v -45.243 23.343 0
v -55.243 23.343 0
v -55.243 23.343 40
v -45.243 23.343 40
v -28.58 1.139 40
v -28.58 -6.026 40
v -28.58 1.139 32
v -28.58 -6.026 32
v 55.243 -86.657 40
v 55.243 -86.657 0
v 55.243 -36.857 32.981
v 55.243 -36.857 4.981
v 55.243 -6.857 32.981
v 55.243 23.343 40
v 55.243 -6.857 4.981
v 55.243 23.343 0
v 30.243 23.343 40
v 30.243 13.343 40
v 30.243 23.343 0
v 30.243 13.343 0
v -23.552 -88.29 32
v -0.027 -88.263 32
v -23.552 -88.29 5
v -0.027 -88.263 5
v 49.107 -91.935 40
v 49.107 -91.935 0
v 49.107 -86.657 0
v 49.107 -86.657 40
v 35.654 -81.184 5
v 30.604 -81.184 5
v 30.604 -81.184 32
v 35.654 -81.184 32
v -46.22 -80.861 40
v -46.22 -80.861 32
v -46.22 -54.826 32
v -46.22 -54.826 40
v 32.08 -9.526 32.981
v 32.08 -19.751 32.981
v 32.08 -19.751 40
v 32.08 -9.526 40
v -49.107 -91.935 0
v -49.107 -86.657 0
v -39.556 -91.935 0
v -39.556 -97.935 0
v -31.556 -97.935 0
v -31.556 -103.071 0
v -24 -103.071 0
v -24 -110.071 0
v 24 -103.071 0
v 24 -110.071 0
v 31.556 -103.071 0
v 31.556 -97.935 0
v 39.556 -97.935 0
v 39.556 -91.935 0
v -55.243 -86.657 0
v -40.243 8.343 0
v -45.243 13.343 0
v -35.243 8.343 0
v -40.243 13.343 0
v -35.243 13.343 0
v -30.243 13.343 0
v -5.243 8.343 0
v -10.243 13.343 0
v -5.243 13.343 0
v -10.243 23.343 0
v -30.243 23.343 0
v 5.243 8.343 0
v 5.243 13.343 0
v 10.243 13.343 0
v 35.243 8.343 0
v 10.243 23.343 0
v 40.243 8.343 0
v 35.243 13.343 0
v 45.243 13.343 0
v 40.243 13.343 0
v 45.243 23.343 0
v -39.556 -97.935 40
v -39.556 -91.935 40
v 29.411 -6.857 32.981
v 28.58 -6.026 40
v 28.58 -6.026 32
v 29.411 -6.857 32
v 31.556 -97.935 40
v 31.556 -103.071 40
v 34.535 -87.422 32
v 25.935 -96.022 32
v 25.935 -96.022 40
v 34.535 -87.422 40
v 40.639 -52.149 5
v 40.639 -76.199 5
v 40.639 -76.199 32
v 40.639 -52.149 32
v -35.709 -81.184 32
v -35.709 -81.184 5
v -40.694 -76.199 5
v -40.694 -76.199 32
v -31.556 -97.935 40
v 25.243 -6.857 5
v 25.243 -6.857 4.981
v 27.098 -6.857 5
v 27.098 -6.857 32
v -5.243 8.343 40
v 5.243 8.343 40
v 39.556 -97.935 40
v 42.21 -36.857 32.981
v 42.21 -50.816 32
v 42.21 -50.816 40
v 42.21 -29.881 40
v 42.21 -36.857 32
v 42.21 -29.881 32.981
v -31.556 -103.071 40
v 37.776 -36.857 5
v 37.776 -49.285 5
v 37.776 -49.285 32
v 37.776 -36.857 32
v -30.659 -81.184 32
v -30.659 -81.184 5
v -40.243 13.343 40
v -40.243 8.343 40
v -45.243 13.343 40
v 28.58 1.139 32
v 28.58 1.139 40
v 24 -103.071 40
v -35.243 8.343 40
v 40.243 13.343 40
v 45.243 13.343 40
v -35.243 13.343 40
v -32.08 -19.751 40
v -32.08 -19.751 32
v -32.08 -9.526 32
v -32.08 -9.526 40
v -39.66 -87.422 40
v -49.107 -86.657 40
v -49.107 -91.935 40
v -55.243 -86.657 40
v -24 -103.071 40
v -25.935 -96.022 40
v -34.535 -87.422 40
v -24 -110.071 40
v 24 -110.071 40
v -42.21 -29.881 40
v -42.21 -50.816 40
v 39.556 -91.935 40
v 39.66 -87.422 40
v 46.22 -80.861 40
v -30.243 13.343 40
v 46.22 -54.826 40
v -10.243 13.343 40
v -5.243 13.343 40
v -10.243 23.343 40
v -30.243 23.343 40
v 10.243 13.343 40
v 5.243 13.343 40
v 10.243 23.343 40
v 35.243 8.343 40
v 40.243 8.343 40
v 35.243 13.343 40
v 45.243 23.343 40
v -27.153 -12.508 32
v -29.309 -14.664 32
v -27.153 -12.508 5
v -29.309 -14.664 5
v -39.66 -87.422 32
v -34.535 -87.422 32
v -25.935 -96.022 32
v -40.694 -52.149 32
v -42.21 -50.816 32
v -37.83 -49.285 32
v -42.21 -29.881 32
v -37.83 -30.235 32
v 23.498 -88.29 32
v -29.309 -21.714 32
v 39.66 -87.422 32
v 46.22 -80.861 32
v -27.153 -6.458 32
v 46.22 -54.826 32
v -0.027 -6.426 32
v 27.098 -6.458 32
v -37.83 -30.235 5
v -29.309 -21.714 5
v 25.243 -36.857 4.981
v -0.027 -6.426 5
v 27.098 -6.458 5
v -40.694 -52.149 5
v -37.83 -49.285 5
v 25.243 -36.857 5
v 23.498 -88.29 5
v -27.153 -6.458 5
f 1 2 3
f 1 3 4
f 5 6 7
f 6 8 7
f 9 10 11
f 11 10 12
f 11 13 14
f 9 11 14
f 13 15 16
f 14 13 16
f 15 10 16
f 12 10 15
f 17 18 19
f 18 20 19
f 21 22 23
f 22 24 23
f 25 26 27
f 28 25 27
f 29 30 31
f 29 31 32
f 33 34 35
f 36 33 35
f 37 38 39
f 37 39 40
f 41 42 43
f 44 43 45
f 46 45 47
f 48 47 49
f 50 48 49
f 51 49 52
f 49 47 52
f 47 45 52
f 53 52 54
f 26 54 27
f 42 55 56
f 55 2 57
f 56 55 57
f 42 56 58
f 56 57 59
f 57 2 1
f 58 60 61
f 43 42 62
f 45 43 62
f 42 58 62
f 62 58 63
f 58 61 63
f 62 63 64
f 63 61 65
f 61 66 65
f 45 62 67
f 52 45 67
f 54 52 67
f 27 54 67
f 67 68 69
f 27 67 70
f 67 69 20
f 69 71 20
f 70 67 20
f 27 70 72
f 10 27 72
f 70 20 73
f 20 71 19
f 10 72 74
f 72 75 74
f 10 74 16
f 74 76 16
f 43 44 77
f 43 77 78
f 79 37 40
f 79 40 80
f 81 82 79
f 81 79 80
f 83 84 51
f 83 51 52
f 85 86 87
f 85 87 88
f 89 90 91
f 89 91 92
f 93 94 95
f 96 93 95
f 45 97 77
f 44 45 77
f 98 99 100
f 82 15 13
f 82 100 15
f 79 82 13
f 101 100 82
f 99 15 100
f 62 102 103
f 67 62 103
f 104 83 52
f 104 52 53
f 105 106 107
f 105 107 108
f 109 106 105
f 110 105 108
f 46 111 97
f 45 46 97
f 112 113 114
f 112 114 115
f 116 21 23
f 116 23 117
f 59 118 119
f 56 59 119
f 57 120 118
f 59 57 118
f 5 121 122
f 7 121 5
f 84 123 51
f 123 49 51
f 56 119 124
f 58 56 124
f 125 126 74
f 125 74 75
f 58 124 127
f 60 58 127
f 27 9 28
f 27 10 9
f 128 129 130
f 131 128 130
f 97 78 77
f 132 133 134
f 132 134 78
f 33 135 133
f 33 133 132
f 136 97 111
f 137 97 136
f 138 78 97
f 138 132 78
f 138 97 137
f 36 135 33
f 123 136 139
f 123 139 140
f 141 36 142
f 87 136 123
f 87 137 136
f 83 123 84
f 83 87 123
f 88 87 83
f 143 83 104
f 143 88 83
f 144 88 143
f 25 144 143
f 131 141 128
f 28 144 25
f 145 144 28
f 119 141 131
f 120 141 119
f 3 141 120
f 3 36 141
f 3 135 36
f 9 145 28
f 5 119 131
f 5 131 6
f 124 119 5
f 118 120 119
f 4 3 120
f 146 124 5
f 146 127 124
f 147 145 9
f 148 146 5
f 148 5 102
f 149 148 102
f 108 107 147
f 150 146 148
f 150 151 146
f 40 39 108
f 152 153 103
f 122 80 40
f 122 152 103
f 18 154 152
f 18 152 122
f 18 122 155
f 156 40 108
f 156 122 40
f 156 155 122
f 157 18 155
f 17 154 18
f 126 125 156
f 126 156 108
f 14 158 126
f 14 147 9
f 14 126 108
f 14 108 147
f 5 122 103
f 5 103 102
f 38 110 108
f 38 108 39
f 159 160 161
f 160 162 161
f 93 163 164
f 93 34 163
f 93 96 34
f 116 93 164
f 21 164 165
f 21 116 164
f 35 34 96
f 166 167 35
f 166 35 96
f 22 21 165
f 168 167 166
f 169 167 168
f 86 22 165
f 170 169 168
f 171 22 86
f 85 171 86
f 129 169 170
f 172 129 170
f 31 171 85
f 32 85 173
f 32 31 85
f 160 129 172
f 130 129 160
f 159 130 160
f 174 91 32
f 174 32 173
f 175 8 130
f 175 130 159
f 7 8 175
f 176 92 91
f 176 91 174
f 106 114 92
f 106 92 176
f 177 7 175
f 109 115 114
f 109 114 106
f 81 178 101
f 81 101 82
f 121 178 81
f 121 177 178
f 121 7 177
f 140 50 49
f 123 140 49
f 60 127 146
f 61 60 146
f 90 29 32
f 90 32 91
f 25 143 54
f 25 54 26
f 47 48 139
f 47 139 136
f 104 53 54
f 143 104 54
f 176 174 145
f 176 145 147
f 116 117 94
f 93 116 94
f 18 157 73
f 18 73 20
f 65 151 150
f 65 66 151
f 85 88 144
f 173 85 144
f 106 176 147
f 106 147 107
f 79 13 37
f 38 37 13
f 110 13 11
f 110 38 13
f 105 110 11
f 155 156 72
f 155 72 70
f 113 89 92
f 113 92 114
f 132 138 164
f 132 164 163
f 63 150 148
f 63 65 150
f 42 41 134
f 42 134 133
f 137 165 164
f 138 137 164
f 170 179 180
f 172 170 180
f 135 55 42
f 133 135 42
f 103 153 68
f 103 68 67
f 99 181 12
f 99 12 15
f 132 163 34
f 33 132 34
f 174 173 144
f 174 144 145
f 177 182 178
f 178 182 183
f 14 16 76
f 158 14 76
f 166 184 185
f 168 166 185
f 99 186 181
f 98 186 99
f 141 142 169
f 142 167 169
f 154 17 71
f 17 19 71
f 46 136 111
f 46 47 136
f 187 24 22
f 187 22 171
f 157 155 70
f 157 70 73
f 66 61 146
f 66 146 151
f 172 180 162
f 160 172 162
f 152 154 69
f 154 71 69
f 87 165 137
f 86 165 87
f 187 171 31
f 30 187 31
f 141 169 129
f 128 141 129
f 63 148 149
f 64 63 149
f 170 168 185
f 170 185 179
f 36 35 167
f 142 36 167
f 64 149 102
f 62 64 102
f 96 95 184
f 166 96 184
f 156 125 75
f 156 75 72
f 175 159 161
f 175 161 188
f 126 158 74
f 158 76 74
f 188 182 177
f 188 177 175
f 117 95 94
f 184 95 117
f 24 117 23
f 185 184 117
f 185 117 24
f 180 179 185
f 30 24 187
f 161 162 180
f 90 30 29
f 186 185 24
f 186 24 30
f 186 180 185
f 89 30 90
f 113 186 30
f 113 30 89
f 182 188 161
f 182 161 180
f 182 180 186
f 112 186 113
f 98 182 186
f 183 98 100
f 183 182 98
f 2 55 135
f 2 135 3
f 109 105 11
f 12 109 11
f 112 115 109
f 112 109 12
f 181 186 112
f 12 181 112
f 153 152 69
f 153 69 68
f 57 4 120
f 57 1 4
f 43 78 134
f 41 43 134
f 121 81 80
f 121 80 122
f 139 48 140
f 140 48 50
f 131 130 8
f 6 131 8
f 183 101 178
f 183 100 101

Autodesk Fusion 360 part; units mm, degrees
sketch "Boceto1" plane through (0, 0, 0) normal (0, 0, 1) x (1, 0, 0)
  line L0 (0, 0) -> (0, 10) construction
  line L1 (55.2426, -86.6569) -> (49.1066, -86.6569)
  line L2 (0, -110.0711) -> (24, -110.0711)
  line L3 (24, -110.0711) -> (24, -103.0711)
  line L4 (24, -103.0711) -> (31.5563, -103.0711)
  line L5 (31.5563, -103.0711) -> (31.5563, -97.935)
  line L6 (31.5563, -97.935) -> (39.5563, -97.935)
  line L7 (39.5563, -97.935) -> (39.5563, -91.935)
  line L8 (39.5563, -91.935) -> (49.1066, -91.935)
  line L9 (49.1066, -91.935) -> (49.1066, -86.6569)
  line L10 (55.2426, -86.6569) -> (55.2426, 23.3431)
  line L11 (55.2426, 23.3431) -> (45.2426, 23.3431)
  line L12 (45.2426, 23.3431) -> (45.2426, 13.3431)
  line L13 (45.2426, 13.3431) -> (40.2426, 13.3431)
  line L14 (40.2426, 13.3431) -> (40.2426, 8.3431)
  line L15 (40.2426, 8.3431) -> (35.2426, 8.3431)
  line L16 (35.2426, 8.3431) -> (35.2426, 13.3431)
  line L17 (35.2426, 13.3431) -> (30.2426, 13.3431)
  line L18 (30.2426, 13.3431) -> (30.2426, 23.3431)
  line L19 (30.2426, 23.3431) -> (10.2426, 23.3431)
  line L20 (10.2426, 23.3431) -> (10.2426, 13.3431)
  line L21 (10.2426, 13.3431) -> (5.2426, 13.3431)
  line L22 (5.2426, 13.3431) -> (5.2426, 8.3431)
  line L23 (5.2426, 8.3431) -> (0, 8.3431)
  line L24 (0, -110.0711) -> (-24, -110.0711)
  line L25 (-24, -110.0711) -> (-24, -103.0711)
  line L26 (-24, -103.0711) -> (-31.5563, -103.0711)
  line L27 (-31.5563, -103.0711) -> (-31.5563, -97.935)
  line L28 (-31.5563, -97.935) -> (-39.5563, -97.935)
  line L29 (-39.5563, -97.935) -> (-39.5563, -91.935)
  line L30 (-39.5563, -91.935) -> (-49.1066, -91.935)
  line L31 (-49.1066, -91.935) -> (-49.1066, -86.6569)
  line L32 (-55.2426, -86.6569) -> (-49.1066, -86.6569)
  line L33 (-55.2426, -86.6569) -> (-55.2426, 23.3431)
  line L34 (-55.2426, 23.3431) -> (-45.2426, 23.3431)
  line L35 (-45.2426, 23.3431) -> (-45.2426, 13.3431)
  line L36 (-45.2426, 13.3431) -> (-40.2426, 13.3431)
  line L37 (-40.2426, 13.3431) -> (-40.2426, 8.3431)
  line L38 (-40.2426, 8.3431) -> (-35.2426, 8.3431)
  line L39 (-35.2426, 8.3431) -> (-35.2426, 13.3431)
  line L40 (-35.2426, 13.3431) -> (-30.2426, 13.3431)
  line L41 (-30.2426, 13.3431) -> (-30.2426, 23.3431)
  line L42 (-30.2426, 23.3431) -> (-10.2426, 23.3431)
  line L43 (-10.2426, 23.3431) -> (-10.2426, 13.3431)
  line L44 (-10.2426, 13.3431) -> (-5.2426, 13.3431)
  line L45 (-5.2426, 13.3431) -> (-5.2426, 8.3431)
  line L46 (-5.2426, 8.3431) -> (0, 8.3431)
  line L47 (-40.4532, -52.2423) -> (-36.5208, -52.2423) construction
  line L48 (-0.0272, -88.2631) -> (-23.5522, -88.2903)
  line L49 (-23.5522, -88.2903) -> (-30.6587, -81.1839)
  line L50 (-23.5522, -88.2903) -> (-13.5022, -88.2903) construction
  line L51 (-30.6587, -81.1839) -> (-35.7087, -81.1839)
  line L52 (-35.7087, -81.1839) -> (-40.6938, -76.1988)
  line L53 (-35.7087, -81.1839) -> (-28.6587, -81.1839) construction
  line L54 (-40.6938, -76.1988) -> (-40.6938, -52.1488)
  line L55 (-40.6938, -52.1488) -> (-37.83, -49.285)
  line L56 (-40.6938, -52.1488) -> (-36.6438, -52.1488) construction
  line L57 (-37.83, -49.285) -> (-37.83, -30.235)
  line L58 (-37.83, -30.235) -> (-29.3093, -21.7144)
  line L59 (-37.83, -30.235) -> (-25.78, -30.235) construction
  line L60 (-29.3093, -21.7144) -> (-29.3093, -14.6644)
  line L61 (-29.3093, -14.6644) -> (-27.1527, -12.5077)
  line L62 (-29.3093, -14.6644) -> (-26.2593, -14.6644) construction
  line L63 (-27.1527, -12.5077) -> (-27.1527, -6.4577)
  line L64 (-0.0272, -88.2631) -> (-0.0272, -6.4263) construction
  line L65 (-0.0272, -6.4263) -> (-27.1527, -6.4577)
  line L66 (-0.0272, -88.2631) -> (23.4977, -88.2903)
  line L67 (23.4977, -88.2903) -> (30.6042, -81.1839)
  line L68 (30.6042, -81.1839) -> (35.6542, -81.1839)
  line L69 (35.6542, -81.1839) -> (40.6393, -76.1988)
  line L70 (40.6393, -76.1988) -> (40.6393, -52.1488)
  line L71 (40.6393, -52.1488) -> (37.7755, -49.285)
  line L72 (37.7755, -49.285) -> (37.7755, -30.235)
  line L73 (37.7755, -30.235) -> (29.2548, -21.7144)
  line L74 (29.2548, -21.7144) -> (29.2548, -14.6644)
  line L75 (29.2548, -14.6644) -> (27.0982, -12.5077)
  line L76 (27.0982, -12.5077) -> (27.0982, -6.4577)
  line L77 (-0.0272, -6.4263) -> (27.0982, -6.4577)
  line L78 (0, -96.0218) -> (0, 0.9507) construction
  line L79 (0, -96.0218) -> (-25.935, -96.0218)
  line L80 (-25.935, -96.0218) -> (-34.5352, -87.4216)
  line L81 (-25.935, -96.0218) -> (-13.7725, -96.0218) construction
  line L82 (-34.5352, -87.4216) -> (-39.6602, -87.4216)
  line L83 (-39.6602, -87.4216) -> (-46.2203, -80.8614)
  line L84 (-39.6602, -87.4216) -> (-30.3827, -87.4216) construction
  line L85 (-46.2203, -80.8614) -> (-46.2203, -54.8264)
  line L86 (-46.2203, -54.8264) -> (-42.2102, -50.8163)
  line L87 (-46.2203, -54.8264) -> (-40.5491, -54.8264) construction
  line L88 (-42.2102, -50.8163) -> (-42.2102, -29.8813)
  line L89 (-42.2102, -29.8813) -> (-32.08, -19.7511)
  line L90 (-42.2102, -29.8813) -> (-27.8839, -29.8813) construction
  line L91 (-32.08, -19.7511) -> (-32.08, -9.5261)
  line L92 (-32.08, -9.5261) -> (-28.5798, -6.0259)
  line L93 (-32.08, -9.5261) -> (-27.13, -9.5261) construction
  line L94 (-28.5798, -6.0259) -> (-28.5798, 1.1391)
  line L95 (-28.5798, 1.1391) -> (0, 1.1391)
  line L96 (0, -96.0218) -> (25.935, -96.0218)
  line L97 (25.935, -96.0218) -> (34.5352, -87.4216)
  line L98 (34.5352, -87.4216) -> (39.6602, -87.4216)
  line L99 (39.6602, -87.4216) -> (46.2203, -80.8614)
  line L100 (46.2203, -80.8614) -> (46.2203, -54.8264)
  line L101 (46.2203, -54.8264) -> (42.2102, -50.8163)
  line L102 (42.2102, -50.8163) -> (42.2102, -29.8813)
  line L103 (42.2102, -29.8813) -> (32.08, -19.7511)
  line L104 (32.08, -19.7511) -> (32.08, -9.5261)
  line L105 (32.08, -9.5261) -> (28.5798, -6.0259)
  line L106 (28.5798, -6.0259) -> (28.5798, 1.1391)
  line L107 (28.5798, 1.1391) -> (0, 1.1391)
  point P0 (0, 4.7536)
  point P1 (0, 4.7536)
  point P2 (0, 4.7536)
  point P3 (0, -47.5355)
  point P4 (0, 2.3859)
  point P5 (0, 2.3859)
  point P6 (0, 2.3859)
  point P7 (0, -47.5355)
  point P8 (0, 0.9507)
  point P9 (0, -47.5355)
  point P10 (0, 0.9507)
  point P11 (0, -47.5355)
  point P12 (0, 0.9507)
  dimension "d46" = 24
  dimension "d48" = 7
  dimension "d49" = 8
  dimension "d50" = 6
  dimension "d52" = 110
  dimension "d53" = 10
  dimension "d54" = 10
  dimension "d55" = 5
  dimension "d56" = 5
  dimension "d57" = 5
  dimension "d58" = 5
  dimension "d59" = 5
  dimension "d60" = 10
  dimension "d61" = 20
  dimension "d62" = 10
  dimension "d63" = 5
  dimension "d64" = 5
  dimension "d144" = 135
  dimension "d145" = 10.05
  dimension "d146" = 5.05
  dimension "d147" = 135
  dimension "d148" = 7.05
  dimension "d149" = 24.05
  dimension "d150" = 4.05
  dimension "d151" = 45
  dimension "d152" = 19.05
  dimension "d153" = 45
  dimension "d154" = 12.05
  dimension "d155" = 7.05
  dimension "d156" = 3.05
  dimension "d157" = 45
  dimension "d158" = 6.05
  dimension "d168" = 135
  dimension "d169" = 12.1625
  dimension "d171" = 5.125
  dimension "d173" = 135
  dimension "d174" = 9.2775
  dimension "d176" = 26.035
  dimension "d178" = 5.6712
  dimension "d179" = 45
  dimension "d181" = 20.935
  dimension "d183" = 45
  dimension "d184" = 14.3262
  dimension "d186" = 10.225
  dimension "d188" = 4.95
  dimension "d189" = 45
  dimension "d191" = 7.165
ref_plane "PlanoDeObra1" through (55.2426, 23.3431, 35) normal (1, 0, 0) x (0, 1, 0)
sketch "Boceto2" plane through (55.2426, 0, 0) normal (1, 0, 0) x (0, 1, 0)
  line L0 (23.1427, -0.0591) -> (-6.8573, -0.0187)
  line L1 (-6.8573, -0.0187) -> (-6.8573, 32.9813)
  line L2 (-6.8573, 32.9813) -> (-36.8573, 32.9813)
  line L3 (-36.8573, 32.9813) -> (-36.8573, 4.9813)
  line L4 (-36.8573, 4.9813) -> (-6.8573, 4.9813)
  dimension "d198" = 30
  dimension "d200" = 30
  dimension "d201" = 28
extrude "Extruir16" add sketch "Boceto1" along normal blind 5 contours L48 L49 L51 L52 L54 L55 L57 L58 L60 L61 L63 L65 L66 L67 L68 L69 L70 L71 L72 L73 L74 L75 L76 L77
extrude "Extruir17" add sketch "Boceto1" along normal blind 32 contours L79 L80 L82 L83 L85 L86 L88 L89 L91 L92 L94 L95 L96 L97 L98 L99 L100 L101 L102 L103 L104 L105 L106 L107
extrude "Extruir18" add sketch "Boceto1" along normal blind 40 contours L1 L2 L3 L4 L5 L6 L7 L8 L9 L10 L11 L12 L13 L14 L15 L16 L17 L18 L19 L20 L21 L22 L23 L24 L25 L26 L27 L28 L29 L30 L31 L32 L33 L34 L35 L36 L37 L38 L39 L40 L41 L42 L43 L44 L45 L46
extrude "Extruir19" cut sketch "Boceto2" along normal mid plane 60
equation "d169 = 12.13748388 mm + 0.025 mm"
equation "d171 = 5.10 mm + 0.025 mm"
equation "d174 = 9.25248834 mm + 0.025 mm"
equation "d176 = 26.01 mm + 0.025 mm"
equation "d178 = 5.64624366 mm + 0.025 mm"
equation "d181 = 20.91 mm + 0.025 mm"
equation "d184 = 14.3012313 mm + 0.025 mm"
equation "d186 = 10.20 mm + 0.025 mm"
equation "d188 = 4.92499554 mm + 0.025 mm"
equation "d191 = 7.14 mm + 0.025 mm"
